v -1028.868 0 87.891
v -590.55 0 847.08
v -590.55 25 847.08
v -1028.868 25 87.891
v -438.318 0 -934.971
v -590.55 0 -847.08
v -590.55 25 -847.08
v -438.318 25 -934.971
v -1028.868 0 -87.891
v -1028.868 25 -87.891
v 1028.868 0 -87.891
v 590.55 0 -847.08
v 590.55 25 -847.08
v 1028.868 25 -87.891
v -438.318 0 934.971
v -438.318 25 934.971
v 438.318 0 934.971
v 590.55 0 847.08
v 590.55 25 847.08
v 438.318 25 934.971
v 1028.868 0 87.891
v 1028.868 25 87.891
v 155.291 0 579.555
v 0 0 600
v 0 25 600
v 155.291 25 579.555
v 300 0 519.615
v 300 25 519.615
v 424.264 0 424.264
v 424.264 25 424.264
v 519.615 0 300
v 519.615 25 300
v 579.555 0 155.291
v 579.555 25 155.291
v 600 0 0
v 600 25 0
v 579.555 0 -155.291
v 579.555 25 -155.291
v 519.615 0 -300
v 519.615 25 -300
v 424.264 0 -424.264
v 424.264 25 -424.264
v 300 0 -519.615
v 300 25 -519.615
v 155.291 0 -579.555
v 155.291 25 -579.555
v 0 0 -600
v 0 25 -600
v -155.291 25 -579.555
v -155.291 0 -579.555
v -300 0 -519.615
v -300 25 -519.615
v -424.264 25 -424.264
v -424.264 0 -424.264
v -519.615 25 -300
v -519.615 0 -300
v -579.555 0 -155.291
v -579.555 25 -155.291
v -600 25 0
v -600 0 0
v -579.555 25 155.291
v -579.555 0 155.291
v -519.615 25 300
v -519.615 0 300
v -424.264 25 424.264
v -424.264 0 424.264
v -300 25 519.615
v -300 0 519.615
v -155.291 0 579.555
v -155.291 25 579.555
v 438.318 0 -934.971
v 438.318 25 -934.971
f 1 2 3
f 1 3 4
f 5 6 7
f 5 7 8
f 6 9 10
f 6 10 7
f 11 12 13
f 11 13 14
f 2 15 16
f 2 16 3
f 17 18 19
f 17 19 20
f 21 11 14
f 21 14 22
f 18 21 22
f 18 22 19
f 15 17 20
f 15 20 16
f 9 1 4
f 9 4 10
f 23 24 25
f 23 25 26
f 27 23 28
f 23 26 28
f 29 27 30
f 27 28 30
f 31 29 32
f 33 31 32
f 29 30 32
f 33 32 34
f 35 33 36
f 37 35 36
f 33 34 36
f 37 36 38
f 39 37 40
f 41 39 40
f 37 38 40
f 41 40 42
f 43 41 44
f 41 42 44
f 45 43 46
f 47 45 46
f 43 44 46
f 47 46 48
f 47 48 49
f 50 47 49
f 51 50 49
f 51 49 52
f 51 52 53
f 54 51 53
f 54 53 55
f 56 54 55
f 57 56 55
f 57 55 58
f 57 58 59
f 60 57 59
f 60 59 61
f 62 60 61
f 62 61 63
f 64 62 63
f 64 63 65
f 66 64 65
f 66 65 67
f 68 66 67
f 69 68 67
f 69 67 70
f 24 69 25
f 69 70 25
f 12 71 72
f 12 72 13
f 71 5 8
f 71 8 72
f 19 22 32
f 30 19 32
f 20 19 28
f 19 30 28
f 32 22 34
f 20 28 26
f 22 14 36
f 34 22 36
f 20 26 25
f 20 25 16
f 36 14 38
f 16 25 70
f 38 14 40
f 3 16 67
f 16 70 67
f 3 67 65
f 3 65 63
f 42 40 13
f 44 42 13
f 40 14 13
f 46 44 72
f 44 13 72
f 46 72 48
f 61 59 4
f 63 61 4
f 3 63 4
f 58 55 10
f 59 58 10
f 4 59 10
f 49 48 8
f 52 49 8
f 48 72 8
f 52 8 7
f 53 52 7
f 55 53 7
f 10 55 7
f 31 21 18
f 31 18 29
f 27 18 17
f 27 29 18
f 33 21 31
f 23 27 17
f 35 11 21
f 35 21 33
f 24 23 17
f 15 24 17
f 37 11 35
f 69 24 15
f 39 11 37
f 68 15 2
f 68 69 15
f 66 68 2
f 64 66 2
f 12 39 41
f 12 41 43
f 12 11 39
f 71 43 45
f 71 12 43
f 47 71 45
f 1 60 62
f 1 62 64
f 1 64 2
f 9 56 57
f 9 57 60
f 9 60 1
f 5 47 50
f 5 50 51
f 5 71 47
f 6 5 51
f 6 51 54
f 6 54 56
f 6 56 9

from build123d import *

# Parameters (mm, degrees)
BOSS_EXTRUDE1_DEPTH = 25
CUT_EXTRUDE1_REACH  = 1392.455
SKETCH2_R           = 600


with BuildPart() as part:
    # Sketch1 → Boss-Extrude1 (new body)
    with BuildSketch(Plane(origin=(0, 0, 0), x_dir=(1, 0, 0), z_dir=(0, 1, 0))):
        Polygon((438.317943801, 934.970880832), (590.549562699, 847.079914683), (1028.8675065, 87.89096615), (1028.8675065, -87.89096615), (590.549562699, -847.079914683), (438.317943801, -934.970880832), (-438.317943801, -934.970880832), (-590.549562699, -847.079914683), (-1028.8675065, -87.89096615), (-1028.8675065, 87.89096615), (-590.549562699, 847.079914683), (-438.317943801, 934.970880832), align=None)
    extrude(amount=BOSS_EXTRUDE1_DEPTH)

    # Sketch2 → Cut-Extrude1 (cut, up to next)
    with BuildSketch(Plane(origin=(0, 25, 0), x_dir=(1, 0, 0), z_dir=(0, 1, 0)), mode=Mode.PRIVATE) as cut_extrude1_sk1:
        with Locations(Location((0, 0, 0), (0, 0, 270))):
            Circle(SKETCH2_R)
    cut_extrude1_tool1 = extrude(cut_extrude1_sk1.sketch, amount=-CUT_EXTRUDE1_REACH, mode=Mode.PRIVATE) & part.part
    add(cut_extrude1_tool1.solids().sort_by_distance((0, 25, 0))[0], mode=Mode.SUBTRACT)


solid = part.part
